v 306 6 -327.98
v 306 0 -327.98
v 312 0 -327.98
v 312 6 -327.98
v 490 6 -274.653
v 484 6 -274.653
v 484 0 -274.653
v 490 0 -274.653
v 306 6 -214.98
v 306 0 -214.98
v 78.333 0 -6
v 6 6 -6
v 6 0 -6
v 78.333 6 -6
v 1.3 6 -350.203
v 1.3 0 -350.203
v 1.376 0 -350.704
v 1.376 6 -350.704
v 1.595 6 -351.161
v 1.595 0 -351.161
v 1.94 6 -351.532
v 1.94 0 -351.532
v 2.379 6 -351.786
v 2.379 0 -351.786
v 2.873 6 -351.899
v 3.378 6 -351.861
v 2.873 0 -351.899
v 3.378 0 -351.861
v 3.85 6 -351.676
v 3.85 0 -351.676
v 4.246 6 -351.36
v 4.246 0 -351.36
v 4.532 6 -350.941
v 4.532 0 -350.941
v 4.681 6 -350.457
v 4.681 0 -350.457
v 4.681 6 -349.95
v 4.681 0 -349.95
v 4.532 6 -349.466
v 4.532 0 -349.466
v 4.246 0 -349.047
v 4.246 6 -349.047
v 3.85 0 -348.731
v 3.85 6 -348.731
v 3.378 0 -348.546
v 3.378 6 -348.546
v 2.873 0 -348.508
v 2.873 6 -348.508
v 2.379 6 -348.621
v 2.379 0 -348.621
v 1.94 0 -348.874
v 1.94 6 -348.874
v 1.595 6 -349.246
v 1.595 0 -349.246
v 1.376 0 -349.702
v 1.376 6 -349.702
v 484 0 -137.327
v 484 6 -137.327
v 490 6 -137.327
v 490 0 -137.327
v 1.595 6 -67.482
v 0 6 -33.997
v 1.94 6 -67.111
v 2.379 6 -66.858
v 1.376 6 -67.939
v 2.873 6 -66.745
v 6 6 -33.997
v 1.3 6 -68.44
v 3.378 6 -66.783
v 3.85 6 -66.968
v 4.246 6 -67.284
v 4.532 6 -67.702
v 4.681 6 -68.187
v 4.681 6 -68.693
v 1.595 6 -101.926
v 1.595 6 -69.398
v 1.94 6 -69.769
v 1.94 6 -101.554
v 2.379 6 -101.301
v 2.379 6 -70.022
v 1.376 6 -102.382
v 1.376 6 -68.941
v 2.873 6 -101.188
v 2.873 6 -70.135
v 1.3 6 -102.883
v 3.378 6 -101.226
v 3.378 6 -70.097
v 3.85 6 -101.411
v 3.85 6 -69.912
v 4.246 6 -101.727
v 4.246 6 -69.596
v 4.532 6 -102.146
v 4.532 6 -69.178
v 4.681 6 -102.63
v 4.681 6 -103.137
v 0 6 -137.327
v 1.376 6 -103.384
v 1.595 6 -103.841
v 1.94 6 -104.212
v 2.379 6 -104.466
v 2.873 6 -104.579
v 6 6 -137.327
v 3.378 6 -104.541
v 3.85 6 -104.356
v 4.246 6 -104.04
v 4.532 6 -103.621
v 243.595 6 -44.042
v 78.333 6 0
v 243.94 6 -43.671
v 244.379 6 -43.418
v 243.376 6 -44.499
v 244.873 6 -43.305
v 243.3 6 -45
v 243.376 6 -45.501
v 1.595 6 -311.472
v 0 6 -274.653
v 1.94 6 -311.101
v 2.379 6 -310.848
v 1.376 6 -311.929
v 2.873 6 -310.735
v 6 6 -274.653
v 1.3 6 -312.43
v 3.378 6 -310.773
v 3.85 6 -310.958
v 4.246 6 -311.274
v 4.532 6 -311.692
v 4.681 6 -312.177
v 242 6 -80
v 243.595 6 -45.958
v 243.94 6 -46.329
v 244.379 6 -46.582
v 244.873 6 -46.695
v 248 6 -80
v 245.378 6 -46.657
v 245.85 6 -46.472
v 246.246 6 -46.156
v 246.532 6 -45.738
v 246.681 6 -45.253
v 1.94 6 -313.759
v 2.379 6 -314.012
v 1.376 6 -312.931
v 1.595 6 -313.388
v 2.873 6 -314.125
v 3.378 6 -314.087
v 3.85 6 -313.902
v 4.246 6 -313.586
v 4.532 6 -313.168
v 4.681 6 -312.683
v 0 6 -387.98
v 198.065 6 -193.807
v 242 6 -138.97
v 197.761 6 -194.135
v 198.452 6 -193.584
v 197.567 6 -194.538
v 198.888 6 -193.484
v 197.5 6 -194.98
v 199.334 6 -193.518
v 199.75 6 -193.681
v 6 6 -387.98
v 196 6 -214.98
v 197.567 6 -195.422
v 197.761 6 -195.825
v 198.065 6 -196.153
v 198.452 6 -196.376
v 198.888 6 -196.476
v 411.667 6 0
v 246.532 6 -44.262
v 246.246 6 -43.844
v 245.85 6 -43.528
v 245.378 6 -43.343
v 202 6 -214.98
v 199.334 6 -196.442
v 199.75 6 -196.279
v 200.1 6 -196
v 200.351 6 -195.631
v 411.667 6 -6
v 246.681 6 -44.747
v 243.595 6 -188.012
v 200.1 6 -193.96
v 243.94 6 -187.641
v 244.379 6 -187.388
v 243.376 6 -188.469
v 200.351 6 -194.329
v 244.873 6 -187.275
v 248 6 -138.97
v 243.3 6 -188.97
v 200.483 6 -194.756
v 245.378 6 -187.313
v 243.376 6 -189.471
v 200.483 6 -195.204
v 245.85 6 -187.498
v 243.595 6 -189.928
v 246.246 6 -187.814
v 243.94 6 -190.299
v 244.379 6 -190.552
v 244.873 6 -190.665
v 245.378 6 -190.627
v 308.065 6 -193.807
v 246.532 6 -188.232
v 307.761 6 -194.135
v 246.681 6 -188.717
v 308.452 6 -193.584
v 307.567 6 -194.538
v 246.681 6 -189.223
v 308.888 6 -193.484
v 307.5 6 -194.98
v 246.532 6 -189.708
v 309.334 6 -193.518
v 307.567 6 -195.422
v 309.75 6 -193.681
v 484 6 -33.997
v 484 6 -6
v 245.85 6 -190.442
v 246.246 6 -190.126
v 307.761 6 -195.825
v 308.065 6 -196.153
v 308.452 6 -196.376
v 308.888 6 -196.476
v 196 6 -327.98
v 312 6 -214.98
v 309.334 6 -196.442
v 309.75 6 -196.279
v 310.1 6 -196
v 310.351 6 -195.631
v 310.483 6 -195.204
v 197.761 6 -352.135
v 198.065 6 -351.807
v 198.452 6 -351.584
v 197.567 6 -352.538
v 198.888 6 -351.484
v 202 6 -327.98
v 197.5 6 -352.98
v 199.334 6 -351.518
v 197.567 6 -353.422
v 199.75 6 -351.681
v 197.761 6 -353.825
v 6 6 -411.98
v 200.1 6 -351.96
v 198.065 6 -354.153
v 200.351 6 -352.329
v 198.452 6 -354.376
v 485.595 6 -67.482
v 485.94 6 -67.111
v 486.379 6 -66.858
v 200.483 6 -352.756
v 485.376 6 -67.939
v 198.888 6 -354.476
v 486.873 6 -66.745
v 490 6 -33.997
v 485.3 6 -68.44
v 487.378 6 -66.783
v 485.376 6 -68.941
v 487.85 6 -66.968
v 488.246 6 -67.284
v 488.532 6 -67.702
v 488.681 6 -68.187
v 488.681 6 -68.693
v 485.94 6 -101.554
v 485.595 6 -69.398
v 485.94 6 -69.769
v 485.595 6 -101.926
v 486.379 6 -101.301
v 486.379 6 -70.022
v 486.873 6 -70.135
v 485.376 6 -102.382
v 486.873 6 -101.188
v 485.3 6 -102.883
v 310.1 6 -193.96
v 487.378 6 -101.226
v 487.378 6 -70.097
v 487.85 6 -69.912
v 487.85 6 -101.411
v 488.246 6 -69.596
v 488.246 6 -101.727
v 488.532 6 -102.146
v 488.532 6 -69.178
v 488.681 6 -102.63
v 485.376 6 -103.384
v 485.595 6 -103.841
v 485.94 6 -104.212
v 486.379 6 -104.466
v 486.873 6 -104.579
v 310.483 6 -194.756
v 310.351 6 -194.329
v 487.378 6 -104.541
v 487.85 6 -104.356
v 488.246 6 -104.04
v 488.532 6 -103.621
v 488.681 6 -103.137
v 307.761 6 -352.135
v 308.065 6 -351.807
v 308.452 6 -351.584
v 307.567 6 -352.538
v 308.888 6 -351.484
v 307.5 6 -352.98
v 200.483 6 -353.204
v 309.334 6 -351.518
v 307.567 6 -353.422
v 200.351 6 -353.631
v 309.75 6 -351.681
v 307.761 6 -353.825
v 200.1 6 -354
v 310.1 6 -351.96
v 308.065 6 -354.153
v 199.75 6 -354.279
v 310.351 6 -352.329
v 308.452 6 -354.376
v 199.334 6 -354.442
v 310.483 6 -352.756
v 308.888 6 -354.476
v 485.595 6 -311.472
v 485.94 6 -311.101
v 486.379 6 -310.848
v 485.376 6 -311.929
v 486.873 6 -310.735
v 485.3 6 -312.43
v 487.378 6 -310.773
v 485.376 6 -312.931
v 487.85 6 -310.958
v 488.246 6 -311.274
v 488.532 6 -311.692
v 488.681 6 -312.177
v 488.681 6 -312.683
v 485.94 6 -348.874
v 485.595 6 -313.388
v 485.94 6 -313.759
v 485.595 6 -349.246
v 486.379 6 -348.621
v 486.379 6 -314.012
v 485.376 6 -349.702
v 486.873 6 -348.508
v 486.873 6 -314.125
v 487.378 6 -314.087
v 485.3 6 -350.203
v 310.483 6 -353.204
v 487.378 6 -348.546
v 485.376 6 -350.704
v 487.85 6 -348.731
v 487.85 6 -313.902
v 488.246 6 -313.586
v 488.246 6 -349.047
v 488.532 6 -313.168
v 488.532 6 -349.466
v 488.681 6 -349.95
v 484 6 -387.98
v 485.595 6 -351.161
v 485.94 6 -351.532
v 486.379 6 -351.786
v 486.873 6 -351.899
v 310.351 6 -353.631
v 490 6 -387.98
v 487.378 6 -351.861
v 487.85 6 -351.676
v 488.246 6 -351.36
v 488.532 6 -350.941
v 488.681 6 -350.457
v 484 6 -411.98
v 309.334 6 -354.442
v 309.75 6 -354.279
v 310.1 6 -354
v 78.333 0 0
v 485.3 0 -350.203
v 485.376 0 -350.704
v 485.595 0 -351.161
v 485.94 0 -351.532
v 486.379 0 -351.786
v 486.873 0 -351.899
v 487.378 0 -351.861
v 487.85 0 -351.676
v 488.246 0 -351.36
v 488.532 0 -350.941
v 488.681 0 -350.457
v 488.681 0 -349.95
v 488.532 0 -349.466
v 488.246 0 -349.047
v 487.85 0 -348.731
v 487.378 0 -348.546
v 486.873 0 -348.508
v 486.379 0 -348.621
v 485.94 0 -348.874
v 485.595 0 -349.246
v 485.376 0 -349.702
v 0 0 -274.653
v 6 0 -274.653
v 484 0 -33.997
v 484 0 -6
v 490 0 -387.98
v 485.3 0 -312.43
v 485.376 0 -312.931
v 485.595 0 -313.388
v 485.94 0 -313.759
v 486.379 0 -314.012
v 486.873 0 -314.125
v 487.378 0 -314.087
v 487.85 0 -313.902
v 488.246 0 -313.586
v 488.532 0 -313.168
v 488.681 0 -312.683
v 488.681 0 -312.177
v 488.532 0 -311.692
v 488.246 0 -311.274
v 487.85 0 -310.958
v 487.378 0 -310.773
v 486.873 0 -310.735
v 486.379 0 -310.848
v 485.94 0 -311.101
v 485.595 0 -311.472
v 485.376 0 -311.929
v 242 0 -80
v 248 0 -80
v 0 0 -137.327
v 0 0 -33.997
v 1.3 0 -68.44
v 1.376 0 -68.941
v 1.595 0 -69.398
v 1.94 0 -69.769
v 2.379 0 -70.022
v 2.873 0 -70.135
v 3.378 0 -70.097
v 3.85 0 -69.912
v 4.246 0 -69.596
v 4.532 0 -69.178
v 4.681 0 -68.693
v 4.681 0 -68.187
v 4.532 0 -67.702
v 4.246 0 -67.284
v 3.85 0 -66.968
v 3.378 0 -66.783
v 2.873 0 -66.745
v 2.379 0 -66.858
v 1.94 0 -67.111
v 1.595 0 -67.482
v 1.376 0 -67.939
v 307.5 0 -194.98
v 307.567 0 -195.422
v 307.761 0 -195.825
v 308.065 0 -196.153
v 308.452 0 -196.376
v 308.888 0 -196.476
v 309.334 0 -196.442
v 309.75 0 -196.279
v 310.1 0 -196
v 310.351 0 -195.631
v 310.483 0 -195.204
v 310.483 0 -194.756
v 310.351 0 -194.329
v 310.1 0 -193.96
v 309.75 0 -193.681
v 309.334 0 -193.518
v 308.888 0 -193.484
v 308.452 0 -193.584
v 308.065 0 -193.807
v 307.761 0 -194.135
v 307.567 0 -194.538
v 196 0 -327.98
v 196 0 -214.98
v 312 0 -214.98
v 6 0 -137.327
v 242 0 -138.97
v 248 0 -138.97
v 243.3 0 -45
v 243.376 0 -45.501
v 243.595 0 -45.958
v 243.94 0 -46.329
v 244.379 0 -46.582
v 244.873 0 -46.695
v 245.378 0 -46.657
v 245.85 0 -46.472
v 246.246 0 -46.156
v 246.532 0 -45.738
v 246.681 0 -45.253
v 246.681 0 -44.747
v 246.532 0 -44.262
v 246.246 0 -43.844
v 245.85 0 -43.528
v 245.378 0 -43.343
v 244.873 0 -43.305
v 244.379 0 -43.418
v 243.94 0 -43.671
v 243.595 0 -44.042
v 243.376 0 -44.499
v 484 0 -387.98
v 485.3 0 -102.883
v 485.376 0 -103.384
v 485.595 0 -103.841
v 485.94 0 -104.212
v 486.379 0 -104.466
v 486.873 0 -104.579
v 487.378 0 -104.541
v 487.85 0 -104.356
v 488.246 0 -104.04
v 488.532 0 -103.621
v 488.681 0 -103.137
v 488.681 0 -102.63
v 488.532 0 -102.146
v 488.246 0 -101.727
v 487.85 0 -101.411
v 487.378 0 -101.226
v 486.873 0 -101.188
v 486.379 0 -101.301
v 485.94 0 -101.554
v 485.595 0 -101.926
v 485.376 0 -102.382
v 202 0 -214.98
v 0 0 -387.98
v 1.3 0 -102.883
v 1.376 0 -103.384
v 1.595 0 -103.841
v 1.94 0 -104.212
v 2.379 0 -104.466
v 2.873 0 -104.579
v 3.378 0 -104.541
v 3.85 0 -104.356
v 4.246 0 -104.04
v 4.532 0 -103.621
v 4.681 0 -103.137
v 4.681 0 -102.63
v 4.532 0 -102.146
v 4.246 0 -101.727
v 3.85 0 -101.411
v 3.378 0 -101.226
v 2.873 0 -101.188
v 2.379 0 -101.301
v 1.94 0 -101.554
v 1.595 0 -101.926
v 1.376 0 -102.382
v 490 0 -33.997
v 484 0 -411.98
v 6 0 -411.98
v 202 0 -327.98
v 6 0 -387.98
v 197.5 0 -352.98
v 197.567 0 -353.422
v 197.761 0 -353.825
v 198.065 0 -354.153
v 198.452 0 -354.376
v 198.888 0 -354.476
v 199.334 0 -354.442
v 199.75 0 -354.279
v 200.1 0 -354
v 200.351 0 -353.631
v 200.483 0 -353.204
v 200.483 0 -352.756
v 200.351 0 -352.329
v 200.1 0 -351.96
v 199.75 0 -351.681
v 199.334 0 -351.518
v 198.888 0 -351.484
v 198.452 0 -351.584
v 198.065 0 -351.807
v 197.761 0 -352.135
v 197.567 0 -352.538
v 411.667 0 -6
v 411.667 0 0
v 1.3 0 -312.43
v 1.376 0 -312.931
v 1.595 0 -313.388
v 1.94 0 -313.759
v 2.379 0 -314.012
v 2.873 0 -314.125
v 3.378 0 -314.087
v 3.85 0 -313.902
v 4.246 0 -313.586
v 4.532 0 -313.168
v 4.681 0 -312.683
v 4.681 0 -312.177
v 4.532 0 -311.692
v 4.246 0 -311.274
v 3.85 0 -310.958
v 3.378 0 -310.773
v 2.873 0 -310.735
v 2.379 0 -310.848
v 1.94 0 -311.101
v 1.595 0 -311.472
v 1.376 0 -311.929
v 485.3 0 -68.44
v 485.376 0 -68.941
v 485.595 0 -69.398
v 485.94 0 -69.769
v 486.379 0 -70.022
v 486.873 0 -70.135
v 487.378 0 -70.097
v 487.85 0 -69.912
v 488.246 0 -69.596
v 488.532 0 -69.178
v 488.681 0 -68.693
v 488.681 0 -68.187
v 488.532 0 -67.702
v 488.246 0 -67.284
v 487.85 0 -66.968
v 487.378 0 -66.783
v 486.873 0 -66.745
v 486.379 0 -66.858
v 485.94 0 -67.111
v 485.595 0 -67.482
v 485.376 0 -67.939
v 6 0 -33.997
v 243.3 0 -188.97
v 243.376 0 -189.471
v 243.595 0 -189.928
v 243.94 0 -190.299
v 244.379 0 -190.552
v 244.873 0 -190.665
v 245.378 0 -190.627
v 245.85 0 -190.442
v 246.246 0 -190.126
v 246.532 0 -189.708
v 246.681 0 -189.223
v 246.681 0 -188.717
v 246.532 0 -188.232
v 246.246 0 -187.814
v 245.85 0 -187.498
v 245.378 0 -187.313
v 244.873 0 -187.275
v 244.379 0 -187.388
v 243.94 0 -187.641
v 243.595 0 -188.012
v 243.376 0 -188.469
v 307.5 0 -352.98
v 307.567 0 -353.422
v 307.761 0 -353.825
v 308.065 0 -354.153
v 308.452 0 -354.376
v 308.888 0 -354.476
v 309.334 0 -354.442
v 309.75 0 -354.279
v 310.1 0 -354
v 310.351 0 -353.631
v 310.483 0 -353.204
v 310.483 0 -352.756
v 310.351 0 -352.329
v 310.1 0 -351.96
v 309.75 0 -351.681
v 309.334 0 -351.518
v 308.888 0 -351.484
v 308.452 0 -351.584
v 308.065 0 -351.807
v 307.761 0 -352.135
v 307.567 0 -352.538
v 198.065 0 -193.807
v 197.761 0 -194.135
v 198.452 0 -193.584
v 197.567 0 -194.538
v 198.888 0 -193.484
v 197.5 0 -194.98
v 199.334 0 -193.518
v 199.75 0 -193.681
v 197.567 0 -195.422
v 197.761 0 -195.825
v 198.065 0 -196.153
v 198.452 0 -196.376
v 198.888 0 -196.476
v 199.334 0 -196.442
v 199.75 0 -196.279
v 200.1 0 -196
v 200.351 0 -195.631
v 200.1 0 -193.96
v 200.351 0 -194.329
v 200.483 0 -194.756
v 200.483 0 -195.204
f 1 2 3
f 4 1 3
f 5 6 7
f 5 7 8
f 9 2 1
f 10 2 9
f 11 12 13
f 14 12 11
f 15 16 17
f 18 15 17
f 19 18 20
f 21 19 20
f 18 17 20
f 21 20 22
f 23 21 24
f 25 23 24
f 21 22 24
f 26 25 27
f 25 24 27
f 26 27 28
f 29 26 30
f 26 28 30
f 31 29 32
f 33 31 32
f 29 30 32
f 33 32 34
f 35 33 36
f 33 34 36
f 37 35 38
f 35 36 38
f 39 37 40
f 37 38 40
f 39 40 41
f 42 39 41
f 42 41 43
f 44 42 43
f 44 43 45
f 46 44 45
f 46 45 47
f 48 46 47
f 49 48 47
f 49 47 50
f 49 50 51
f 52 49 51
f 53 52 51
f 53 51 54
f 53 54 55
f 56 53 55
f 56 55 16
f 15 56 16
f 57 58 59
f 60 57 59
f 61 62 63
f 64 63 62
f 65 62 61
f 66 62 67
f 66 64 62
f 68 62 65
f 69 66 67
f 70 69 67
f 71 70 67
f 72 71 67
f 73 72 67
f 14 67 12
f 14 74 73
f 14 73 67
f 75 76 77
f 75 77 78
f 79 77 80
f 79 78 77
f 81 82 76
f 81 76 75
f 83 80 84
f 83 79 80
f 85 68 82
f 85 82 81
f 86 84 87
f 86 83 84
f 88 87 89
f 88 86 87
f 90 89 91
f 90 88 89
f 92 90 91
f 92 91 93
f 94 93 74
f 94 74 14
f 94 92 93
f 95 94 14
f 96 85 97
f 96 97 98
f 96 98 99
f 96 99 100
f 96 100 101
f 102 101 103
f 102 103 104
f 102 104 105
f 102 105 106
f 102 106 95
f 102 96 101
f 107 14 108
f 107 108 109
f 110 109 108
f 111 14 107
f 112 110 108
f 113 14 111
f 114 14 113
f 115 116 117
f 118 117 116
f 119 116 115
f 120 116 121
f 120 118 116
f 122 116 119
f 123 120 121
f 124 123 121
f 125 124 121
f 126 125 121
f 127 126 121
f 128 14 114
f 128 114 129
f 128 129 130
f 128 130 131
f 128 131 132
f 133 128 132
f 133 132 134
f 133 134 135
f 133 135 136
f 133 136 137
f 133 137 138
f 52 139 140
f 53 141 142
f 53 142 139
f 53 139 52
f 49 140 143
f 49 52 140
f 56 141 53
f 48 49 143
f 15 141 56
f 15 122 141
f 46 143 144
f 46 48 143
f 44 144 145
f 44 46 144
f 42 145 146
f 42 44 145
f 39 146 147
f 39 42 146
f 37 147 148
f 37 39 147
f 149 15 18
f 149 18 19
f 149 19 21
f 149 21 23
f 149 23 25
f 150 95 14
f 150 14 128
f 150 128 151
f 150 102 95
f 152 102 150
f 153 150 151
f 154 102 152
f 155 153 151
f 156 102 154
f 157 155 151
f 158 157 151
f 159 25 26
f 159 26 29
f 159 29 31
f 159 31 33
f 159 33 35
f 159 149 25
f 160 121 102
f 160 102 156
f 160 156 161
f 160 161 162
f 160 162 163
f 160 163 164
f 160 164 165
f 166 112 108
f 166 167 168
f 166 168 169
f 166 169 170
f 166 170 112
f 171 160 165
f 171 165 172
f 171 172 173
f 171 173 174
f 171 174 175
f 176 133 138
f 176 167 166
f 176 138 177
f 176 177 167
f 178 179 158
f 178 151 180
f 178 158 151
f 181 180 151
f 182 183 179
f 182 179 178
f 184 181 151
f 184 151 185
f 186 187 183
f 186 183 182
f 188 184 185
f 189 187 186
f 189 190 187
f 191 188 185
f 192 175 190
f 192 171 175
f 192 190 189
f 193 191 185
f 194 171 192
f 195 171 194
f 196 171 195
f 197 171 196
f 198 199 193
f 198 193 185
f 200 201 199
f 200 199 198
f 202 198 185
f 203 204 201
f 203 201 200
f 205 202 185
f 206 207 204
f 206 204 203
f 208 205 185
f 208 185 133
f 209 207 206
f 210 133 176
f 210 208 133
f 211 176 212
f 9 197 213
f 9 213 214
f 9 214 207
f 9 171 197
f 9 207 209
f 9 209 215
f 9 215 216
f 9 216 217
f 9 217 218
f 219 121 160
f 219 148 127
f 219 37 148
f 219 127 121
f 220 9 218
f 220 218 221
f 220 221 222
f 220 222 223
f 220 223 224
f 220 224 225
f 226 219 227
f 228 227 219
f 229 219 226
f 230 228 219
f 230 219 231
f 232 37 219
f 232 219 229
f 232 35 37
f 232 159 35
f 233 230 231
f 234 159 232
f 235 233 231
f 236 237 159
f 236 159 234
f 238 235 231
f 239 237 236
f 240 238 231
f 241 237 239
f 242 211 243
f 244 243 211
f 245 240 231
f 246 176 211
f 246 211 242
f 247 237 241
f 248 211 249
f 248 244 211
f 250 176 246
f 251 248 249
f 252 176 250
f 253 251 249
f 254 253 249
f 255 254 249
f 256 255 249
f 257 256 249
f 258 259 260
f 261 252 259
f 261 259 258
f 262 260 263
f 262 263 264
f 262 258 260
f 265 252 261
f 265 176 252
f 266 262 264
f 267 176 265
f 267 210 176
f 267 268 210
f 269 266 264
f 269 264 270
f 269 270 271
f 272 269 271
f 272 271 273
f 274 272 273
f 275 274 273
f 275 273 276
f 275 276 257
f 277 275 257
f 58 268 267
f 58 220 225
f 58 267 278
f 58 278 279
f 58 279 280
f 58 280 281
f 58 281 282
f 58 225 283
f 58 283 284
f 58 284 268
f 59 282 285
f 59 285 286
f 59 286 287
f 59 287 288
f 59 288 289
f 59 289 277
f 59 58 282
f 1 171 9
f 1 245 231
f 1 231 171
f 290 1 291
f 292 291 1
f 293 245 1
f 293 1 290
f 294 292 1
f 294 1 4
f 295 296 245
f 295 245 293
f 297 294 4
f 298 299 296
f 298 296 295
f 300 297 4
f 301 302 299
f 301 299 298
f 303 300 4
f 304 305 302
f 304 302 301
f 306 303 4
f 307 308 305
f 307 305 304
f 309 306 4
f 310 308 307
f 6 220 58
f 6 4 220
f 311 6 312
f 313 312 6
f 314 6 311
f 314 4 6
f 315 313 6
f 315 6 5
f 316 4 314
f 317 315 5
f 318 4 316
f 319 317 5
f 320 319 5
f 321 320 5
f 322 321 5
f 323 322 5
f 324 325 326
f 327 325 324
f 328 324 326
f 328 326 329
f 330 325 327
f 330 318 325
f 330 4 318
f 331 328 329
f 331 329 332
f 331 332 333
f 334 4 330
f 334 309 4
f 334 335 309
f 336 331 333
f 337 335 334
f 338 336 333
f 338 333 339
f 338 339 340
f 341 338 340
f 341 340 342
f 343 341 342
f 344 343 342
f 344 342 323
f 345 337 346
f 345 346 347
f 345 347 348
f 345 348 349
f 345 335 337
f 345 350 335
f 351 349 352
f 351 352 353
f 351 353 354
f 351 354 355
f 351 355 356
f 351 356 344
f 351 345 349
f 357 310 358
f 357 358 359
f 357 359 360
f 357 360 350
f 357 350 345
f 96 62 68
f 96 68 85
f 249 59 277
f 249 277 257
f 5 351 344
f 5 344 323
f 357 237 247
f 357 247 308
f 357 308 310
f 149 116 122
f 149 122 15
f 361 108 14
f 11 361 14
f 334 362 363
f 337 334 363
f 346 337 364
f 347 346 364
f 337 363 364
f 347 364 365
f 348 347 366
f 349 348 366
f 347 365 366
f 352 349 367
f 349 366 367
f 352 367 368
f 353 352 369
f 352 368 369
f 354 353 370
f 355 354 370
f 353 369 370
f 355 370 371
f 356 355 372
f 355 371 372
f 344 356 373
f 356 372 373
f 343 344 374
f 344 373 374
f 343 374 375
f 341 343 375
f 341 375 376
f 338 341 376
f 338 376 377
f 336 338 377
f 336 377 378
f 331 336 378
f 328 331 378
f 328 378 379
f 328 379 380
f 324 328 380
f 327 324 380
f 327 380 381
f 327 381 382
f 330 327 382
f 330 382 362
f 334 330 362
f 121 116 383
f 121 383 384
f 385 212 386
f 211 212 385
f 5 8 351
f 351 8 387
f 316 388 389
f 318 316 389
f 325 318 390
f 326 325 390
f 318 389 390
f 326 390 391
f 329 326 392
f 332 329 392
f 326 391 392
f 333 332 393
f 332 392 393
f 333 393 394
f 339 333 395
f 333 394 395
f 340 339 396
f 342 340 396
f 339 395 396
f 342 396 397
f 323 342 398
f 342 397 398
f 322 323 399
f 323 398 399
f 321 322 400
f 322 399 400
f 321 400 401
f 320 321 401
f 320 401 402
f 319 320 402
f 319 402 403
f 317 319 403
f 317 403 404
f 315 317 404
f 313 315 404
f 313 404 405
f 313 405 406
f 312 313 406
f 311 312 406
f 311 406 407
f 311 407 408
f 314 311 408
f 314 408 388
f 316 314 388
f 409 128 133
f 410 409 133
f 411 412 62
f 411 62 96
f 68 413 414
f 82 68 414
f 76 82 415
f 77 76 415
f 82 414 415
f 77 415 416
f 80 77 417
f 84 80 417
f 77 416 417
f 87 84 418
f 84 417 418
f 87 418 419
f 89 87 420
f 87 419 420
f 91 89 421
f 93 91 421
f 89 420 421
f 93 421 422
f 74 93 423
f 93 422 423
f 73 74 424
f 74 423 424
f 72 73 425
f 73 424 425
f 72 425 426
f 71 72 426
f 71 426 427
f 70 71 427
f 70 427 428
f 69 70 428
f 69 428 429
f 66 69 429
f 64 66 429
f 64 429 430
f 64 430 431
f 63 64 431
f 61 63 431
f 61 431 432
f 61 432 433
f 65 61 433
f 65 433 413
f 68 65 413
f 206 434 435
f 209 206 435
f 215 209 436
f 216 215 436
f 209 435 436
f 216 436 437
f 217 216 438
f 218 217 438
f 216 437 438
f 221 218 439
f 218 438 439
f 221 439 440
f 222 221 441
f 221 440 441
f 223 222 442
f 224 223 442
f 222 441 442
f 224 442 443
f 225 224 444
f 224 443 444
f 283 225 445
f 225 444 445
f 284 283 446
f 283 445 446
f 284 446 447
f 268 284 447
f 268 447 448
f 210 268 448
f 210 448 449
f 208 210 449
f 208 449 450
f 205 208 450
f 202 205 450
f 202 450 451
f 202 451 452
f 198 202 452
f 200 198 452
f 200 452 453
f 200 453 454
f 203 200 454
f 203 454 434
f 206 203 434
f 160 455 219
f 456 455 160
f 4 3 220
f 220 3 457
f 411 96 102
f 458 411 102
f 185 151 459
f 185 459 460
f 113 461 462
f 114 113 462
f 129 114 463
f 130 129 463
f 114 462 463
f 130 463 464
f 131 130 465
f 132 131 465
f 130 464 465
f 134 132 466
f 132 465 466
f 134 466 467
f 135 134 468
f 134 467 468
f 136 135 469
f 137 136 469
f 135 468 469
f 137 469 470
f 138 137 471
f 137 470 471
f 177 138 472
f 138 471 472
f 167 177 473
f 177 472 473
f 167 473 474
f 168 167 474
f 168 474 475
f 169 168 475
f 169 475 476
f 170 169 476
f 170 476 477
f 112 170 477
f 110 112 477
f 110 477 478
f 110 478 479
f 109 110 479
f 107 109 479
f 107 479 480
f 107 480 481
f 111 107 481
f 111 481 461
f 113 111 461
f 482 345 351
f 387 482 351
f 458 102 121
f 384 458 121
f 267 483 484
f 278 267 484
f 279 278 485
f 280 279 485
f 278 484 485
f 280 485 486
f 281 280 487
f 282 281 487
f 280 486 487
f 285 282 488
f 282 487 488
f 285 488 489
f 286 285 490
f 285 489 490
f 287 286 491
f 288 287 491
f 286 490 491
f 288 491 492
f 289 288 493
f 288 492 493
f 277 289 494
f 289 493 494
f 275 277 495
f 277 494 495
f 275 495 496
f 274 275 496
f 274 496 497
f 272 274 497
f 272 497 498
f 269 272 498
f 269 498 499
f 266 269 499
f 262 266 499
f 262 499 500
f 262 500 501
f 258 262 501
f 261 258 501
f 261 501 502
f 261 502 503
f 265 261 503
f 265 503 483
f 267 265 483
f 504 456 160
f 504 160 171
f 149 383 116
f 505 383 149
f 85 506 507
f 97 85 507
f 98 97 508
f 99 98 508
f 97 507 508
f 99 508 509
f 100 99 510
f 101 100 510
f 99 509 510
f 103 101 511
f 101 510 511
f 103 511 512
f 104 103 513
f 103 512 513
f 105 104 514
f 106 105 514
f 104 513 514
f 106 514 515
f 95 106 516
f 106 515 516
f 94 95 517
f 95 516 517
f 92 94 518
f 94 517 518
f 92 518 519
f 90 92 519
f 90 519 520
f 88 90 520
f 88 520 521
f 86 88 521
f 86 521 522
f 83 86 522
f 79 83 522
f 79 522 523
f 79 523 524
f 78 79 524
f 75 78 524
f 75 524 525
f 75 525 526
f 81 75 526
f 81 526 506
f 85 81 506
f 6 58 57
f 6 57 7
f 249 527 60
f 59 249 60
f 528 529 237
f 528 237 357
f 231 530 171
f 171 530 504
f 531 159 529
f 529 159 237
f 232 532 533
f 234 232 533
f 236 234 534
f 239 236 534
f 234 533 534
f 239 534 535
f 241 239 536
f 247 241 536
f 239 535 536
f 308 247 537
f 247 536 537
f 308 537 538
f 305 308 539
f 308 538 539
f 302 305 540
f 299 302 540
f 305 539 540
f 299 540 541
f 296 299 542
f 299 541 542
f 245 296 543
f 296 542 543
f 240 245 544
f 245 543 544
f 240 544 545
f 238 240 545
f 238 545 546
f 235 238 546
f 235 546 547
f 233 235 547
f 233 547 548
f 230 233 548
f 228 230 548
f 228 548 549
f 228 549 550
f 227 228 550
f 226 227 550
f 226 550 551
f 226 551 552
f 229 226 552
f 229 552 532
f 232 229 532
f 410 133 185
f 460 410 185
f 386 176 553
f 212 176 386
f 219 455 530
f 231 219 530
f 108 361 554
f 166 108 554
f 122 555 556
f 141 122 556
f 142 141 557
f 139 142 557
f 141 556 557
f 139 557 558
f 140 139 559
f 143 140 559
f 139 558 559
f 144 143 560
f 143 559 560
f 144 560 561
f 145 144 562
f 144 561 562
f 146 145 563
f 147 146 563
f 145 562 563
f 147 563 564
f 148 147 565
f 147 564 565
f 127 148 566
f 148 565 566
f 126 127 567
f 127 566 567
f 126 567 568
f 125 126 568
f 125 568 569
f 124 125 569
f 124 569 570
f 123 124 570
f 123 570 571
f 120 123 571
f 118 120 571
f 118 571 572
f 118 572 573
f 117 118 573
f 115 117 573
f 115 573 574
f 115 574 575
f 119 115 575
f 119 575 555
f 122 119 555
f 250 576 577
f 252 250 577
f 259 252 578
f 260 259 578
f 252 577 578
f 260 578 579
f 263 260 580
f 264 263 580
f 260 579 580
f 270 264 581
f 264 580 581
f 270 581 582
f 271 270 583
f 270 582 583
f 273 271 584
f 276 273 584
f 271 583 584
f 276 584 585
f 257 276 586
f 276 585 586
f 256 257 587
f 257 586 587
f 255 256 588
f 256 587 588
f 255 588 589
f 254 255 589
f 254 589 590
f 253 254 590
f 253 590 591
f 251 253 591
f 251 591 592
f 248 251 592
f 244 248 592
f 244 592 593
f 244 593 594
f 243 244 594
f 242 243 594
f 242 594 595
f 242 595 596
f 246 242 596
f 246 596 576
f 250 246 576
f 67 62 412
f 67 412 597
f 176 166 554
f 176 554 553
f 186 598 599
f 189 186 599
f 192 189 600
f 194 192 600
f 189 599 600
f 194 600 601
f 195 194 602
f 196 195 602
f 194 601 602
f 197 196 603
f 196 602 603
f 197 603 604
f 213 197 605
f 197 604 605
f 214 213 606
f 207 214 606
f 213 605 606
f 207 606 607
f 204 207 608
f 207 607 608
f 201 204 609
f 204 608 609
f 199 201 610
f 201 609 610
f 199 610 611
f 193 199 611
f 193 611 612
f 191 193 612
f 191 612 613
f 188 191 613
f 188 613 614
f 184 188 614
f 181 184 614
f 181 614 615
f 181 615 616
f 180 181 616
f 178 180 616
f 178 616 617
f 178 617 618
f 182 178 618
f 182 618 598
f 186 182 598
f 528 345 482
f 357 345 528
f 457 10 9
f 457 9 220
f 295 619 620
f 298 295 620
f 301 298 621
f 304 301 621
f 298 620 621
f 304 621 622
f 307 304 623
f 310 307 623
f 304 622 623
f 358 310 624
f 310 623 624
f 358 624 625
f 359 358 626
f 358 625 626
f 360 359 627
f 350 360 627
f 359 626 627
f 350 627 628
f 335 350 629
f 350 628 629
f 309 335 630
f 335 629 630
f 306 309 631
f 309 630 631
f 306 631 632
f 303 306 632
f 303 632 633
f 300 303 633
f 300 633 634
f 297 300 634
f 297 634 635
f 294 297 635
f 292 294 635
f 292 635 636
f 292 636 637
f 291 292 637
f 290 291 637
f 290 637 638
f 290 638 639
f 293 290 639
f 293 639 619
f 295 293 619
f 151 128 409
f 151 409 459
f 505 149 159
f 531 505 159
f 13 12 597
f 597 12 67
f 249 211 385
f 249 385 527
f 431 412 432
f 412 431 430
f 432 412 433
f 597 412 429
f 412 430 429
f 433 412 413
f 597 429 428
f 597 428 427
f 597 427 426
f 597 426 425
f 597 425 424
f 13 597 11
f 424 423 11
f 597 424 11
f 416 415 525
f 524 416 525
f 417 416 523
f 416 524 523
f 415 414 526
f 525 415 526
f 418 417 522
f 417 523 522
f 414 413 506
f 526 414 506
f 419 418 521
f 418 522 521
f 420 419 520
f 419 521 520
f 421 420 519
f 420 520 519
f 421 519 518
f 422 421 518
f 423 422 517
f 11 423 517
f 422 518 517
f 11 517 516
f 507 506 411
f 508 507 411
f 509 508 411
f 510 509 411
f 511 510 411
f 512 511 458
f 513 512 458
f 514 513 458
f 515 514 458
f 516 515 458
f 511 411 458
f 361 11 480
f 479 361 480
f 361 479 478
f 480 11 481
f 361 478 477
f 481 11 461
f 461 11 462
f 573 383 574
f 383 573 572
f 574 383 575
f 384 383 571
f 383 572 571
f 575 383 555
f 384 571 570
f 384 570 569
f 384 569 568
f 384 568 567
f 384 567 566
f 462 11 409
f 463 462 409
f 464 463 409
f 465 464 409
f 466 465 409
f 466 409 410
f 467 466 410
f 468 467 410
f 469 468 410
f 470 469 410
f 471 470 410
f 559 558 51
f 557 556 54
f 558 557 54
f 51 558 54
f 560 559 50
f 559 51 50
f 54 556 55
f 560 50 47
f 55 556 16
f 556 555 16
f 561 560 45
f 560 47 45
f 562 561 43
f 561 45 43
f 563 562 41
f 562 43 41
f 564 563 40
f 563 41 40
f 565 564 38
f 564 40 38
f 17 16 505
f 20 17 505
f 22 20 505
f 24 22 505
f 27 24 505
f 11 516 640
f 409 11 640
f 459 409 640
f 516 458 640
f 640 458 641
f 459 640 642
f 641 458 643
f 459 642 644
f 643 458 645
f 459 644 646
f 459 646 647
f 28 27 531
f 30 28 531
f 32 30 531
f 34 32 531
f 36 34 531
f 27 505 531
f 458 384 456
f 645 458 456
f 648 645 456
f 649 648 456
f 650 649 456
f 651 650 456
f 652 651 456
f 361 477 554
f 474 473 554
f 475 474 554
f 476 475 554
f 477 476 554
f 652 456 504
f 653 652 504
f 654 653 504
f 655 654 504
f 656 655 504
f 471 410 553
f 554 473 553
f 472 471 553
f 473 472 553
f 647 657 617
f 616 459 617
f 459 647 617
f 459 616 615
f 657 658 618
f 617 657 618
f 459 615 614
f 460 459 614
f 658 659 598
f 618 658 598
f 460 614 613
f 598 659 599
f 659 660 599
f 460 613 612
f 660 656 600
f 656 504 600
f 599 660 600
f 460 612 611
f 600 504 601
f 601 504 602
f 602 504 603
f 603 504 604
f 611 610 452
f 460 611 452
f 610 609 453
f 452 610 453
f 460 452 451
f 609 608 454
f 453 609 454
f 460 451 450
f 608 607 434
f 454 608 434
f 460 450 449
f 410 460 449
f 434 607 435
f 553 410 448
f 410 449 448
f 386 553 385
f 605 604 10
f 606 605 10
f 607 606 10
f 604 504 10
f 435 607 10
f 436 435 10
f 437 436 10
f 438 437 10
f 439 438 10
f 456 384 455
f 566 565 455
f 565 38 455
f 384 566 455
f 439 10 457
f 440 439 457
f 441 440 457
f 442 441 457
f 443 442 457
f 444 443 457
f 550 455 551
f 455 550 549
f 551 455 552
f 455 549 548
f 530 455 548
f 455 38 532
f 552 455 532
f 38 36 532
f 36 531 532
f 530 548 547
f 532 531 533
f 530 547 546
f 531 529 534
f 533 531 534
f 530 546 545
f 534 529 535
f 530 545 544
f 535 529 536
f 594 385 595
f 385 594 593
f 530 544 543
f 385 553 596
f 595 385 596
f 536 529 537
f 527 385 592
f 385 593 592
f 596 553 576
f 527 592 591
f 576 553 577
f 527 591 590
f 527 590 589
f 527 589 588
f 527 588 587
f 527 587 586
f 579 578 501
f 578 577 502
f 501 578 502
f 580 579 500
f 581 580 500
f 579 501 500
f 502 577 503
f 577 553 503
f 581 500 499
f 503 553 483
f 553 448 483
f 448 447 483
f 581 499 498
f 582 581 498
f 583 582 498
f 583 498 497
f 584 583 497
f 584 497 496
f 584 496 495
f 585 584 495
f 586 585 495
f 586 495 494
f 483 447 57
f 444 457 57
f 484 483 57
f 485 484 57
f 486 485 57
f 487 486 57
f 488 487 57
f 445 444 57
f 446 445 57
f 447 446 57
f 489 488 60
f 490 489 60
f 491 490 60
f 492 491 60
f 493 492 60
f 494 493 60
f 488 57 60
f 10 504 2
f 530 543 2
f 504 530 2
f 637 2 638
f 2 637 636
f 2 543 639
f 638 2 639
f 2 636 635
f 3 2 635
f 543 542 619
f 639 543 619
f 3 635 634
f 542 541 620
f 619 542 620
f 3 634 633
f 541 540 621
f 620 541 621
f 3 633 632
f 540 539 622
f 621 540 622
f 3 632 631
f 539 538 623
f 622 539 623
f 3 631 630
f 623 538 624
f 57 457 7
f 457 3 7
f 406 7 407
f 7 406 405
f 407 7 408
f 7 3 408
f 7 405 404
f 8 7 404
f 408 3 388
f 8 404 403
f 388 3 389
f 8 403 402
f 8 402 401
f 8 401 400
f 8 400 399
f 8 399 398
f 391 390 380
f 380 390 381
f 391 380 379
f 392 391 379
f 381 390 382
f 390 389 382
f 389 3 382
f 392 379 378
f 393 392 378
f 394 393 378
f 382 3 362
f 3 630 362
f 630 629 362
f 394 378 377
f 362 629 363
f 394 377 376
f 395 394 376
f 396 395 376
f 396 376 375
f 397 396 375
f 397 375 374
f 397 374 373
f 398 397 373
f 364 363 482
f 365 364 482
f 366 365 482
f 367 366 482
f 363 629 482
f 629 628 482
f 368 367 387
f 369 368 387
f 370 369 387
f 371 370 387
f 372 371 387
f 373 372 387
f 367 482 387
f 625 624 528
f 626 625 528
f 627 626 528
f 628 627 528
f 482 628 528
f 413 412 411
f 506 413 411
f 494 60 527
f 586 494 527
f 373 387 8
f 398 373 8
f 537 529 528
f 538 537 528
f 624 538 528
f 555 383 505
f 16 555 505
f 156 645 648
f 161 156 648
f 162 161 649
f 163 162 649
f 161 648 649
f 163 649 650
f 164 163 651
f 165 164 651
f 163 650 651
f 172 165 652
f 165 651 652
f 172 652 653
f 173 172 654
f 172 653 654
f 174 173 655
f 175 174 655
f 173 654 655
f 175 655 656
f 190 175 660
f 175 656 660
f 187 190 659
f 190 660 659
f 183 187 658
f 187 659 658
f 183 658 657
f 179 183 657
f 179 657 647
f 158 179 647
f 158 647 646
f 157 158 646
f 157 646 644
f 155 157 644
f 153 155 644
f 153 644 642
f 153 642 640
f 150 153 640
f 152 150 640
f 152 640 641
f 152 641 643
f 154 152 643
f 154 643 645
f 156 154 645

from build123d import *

# Parameters (mm, degrees)
SKETCH1_W             = 490
SKETCH1_H             = 411.98
BOSS_EXTRUDE1_DEPTH   = 6
SKETCH2_W             = 78.33333333
SKETCH2_H             = 6
SKETCH2_W_2           = 6
SKETCH2_H_2           = 137.326666666
CUT_EXTRUDE1_DEPTH    = 12
SKETCH4_W             = 6
SKETCH4_H             = 24
SKETCH4_H_2           = 27.996666667
CUT_EXTRUDE2_DEPTH    = 12
SKETCH6_W             = 6
SKETCH6_H             = 58.97
CUT_EXTRUDE3_DEPTH    = 641.20584221
M3_CLEARANCE_HOLE1_D  = 3.4
F_3_0MM_DOWEL_HOLE1_D = 3
CUT_EXTRUDE4_REACH    = 642.206
SKETCH11_W            = 6
SKETCH11_H            = 113


with BuildPart() as part:
    # Sketch1 → Boss-Extrude1 (new body)
    with BuildSketch(Plane(origin=(0, 0, 0), x_dir=(1, 0, 0), z_dir=(0, 1, 0))):
        with Locations((245, 205.99)):
            Rectangle(SKETCH1_W, SKETCH1_H)
    extrude(amount=BOSS_EXTRUDE1_DEPTH)

    # Sketch2 → Cut-Extrude1 (cut)
    with BuildSketch(Plane(origin=(0, 6, 0), x_dir=(1, 0, 0), z_dir=(0, 1, 0))):
        with Locations((39.166666665, 3)):
            Rectangle(SKETCH2_W, SKETCH2_H)
        with Locations((450.833333335, 3)):
            Rectangle(SKETCH2_W, SKETCH2_H)
        with Locations((3, 205.99)):
            Rectangle(SKETCH2_W_2, SKETCH2_H_2)
        with Locations((487, 205.99)):
            Rectangle(SKETCH2_W_2, SKETCH2_H_2)
    extrude(amount=-CUT_EXTRUDE1_DEPTH, mode=Mode.SUBTRACT)

    # Sketch4 → Cut-Extrude2 (cut)
    with BuildSketch(Plane(origin=(0, 6, 0), x_dir=(1, 0, 0), z_dir=(0, 1, 0))):
        with Locations((3, 399.98)):
            Rectangle(SKETCH4_W, SKETCH4_H)
        with Locations((487, 399.98)):
            Rectangle(SKETCH4_W, SKETCH4_H)
        with Locations((487, 19.998333333)):
            Rectangle(SKETCH4_W, SKETCH4_H_2)
        with Locations((3, 19.998333333)):
            Rectangle(SKETCH4_W, SKETCH4_H_2)
    extrude(amount=-CUT_EXTRUDE2_DEPTH, mode=Mode.SUBTRACT)

    # Sketch6 → Cut-Extrude3 (cut, through all)
    with BuildSketch(Plane(origin=(0, 6, 0), x_dir=(1, 0, 0), z_dir=(0, 1, 0))):
        with Locations((245, 109.485)):
            Rectangle(SKETCH6_W, SKETCH6_H)
    extrude(amount=-CUT_EXTRUDE3_DEPTH, mode=Mode.SUBTRACT)

    # M3 Clearance Hole1 (through all)
    with Locations(Plane(origin=(0, 6, 0), x_dir=(1, 0, 0), z_dir=(0, 1, 0))):
        with Locations((3, 350.203333333), (3, 312.43), (3, 102.883333333), (3, 68.44), (487, 350.203333333), (487, 312.43), (487, 102.883333333), (487, 68.44), (245, 188.97), (245, 45)):
            Hole(M3_CLEARANCE_HOLE1_D / 2)

    # Ø3.0mm Dowel Hole1 (through all)
    with Locations(Plane(origin=(0, 6, 0), x_dir=(1, 0, 0), z_dir=(0, 1, 0))):
        with Locations((309, 352.98), (309, 194.98), (199, 352.98), (199, 194.98)):
            Hole(F_3_0MM_DOWEL_HOLE1_D / 2)

    # Sketch11 → Cut-Extrude4 (cut, up to next)
    with BuildSketch(Plane.XZ, mode=Mode.PRIVATE) as cut_extrude4_sk1:
        with Locations((309, -271.48)):
            Rectangle(SKETCH11_W, SKETCH11_H)
    cut_extrude4_tool1 = extrude(cut_extrude4_sk1.sketch, amount=-CUT_EXTRUDE4_REACH, mode=Mode.PRIVATE) & part.part
    # Sketch11 → Cut-Extrude4 (cut, up to next)
    with BuildSketch(Plane.XZ, mode=Mode.PRIVATE) as cut_extrude4_sk2:
        with Locations((199, -271.48)):
            Rectangle(SKETCH11_W, SKETCH11_H)
    cut_extrude4_tool2 = extrude(cut_extrude4_sk2.sketch, amount=-CUT_EXTRUDE4_REACH, mode=Mode.PRIVATE) & part.part
    add(cut_extrude4_tool1.solids().sort_by_distance((309, 0, -271.48))[0], mode=Mode.SUBTRACT)
    add(cut_extrude4_tool2.solids().sort_by_distance((199, 0, -271.48))[0], mode=Mode.SUBTRACT)


solid = part.part
